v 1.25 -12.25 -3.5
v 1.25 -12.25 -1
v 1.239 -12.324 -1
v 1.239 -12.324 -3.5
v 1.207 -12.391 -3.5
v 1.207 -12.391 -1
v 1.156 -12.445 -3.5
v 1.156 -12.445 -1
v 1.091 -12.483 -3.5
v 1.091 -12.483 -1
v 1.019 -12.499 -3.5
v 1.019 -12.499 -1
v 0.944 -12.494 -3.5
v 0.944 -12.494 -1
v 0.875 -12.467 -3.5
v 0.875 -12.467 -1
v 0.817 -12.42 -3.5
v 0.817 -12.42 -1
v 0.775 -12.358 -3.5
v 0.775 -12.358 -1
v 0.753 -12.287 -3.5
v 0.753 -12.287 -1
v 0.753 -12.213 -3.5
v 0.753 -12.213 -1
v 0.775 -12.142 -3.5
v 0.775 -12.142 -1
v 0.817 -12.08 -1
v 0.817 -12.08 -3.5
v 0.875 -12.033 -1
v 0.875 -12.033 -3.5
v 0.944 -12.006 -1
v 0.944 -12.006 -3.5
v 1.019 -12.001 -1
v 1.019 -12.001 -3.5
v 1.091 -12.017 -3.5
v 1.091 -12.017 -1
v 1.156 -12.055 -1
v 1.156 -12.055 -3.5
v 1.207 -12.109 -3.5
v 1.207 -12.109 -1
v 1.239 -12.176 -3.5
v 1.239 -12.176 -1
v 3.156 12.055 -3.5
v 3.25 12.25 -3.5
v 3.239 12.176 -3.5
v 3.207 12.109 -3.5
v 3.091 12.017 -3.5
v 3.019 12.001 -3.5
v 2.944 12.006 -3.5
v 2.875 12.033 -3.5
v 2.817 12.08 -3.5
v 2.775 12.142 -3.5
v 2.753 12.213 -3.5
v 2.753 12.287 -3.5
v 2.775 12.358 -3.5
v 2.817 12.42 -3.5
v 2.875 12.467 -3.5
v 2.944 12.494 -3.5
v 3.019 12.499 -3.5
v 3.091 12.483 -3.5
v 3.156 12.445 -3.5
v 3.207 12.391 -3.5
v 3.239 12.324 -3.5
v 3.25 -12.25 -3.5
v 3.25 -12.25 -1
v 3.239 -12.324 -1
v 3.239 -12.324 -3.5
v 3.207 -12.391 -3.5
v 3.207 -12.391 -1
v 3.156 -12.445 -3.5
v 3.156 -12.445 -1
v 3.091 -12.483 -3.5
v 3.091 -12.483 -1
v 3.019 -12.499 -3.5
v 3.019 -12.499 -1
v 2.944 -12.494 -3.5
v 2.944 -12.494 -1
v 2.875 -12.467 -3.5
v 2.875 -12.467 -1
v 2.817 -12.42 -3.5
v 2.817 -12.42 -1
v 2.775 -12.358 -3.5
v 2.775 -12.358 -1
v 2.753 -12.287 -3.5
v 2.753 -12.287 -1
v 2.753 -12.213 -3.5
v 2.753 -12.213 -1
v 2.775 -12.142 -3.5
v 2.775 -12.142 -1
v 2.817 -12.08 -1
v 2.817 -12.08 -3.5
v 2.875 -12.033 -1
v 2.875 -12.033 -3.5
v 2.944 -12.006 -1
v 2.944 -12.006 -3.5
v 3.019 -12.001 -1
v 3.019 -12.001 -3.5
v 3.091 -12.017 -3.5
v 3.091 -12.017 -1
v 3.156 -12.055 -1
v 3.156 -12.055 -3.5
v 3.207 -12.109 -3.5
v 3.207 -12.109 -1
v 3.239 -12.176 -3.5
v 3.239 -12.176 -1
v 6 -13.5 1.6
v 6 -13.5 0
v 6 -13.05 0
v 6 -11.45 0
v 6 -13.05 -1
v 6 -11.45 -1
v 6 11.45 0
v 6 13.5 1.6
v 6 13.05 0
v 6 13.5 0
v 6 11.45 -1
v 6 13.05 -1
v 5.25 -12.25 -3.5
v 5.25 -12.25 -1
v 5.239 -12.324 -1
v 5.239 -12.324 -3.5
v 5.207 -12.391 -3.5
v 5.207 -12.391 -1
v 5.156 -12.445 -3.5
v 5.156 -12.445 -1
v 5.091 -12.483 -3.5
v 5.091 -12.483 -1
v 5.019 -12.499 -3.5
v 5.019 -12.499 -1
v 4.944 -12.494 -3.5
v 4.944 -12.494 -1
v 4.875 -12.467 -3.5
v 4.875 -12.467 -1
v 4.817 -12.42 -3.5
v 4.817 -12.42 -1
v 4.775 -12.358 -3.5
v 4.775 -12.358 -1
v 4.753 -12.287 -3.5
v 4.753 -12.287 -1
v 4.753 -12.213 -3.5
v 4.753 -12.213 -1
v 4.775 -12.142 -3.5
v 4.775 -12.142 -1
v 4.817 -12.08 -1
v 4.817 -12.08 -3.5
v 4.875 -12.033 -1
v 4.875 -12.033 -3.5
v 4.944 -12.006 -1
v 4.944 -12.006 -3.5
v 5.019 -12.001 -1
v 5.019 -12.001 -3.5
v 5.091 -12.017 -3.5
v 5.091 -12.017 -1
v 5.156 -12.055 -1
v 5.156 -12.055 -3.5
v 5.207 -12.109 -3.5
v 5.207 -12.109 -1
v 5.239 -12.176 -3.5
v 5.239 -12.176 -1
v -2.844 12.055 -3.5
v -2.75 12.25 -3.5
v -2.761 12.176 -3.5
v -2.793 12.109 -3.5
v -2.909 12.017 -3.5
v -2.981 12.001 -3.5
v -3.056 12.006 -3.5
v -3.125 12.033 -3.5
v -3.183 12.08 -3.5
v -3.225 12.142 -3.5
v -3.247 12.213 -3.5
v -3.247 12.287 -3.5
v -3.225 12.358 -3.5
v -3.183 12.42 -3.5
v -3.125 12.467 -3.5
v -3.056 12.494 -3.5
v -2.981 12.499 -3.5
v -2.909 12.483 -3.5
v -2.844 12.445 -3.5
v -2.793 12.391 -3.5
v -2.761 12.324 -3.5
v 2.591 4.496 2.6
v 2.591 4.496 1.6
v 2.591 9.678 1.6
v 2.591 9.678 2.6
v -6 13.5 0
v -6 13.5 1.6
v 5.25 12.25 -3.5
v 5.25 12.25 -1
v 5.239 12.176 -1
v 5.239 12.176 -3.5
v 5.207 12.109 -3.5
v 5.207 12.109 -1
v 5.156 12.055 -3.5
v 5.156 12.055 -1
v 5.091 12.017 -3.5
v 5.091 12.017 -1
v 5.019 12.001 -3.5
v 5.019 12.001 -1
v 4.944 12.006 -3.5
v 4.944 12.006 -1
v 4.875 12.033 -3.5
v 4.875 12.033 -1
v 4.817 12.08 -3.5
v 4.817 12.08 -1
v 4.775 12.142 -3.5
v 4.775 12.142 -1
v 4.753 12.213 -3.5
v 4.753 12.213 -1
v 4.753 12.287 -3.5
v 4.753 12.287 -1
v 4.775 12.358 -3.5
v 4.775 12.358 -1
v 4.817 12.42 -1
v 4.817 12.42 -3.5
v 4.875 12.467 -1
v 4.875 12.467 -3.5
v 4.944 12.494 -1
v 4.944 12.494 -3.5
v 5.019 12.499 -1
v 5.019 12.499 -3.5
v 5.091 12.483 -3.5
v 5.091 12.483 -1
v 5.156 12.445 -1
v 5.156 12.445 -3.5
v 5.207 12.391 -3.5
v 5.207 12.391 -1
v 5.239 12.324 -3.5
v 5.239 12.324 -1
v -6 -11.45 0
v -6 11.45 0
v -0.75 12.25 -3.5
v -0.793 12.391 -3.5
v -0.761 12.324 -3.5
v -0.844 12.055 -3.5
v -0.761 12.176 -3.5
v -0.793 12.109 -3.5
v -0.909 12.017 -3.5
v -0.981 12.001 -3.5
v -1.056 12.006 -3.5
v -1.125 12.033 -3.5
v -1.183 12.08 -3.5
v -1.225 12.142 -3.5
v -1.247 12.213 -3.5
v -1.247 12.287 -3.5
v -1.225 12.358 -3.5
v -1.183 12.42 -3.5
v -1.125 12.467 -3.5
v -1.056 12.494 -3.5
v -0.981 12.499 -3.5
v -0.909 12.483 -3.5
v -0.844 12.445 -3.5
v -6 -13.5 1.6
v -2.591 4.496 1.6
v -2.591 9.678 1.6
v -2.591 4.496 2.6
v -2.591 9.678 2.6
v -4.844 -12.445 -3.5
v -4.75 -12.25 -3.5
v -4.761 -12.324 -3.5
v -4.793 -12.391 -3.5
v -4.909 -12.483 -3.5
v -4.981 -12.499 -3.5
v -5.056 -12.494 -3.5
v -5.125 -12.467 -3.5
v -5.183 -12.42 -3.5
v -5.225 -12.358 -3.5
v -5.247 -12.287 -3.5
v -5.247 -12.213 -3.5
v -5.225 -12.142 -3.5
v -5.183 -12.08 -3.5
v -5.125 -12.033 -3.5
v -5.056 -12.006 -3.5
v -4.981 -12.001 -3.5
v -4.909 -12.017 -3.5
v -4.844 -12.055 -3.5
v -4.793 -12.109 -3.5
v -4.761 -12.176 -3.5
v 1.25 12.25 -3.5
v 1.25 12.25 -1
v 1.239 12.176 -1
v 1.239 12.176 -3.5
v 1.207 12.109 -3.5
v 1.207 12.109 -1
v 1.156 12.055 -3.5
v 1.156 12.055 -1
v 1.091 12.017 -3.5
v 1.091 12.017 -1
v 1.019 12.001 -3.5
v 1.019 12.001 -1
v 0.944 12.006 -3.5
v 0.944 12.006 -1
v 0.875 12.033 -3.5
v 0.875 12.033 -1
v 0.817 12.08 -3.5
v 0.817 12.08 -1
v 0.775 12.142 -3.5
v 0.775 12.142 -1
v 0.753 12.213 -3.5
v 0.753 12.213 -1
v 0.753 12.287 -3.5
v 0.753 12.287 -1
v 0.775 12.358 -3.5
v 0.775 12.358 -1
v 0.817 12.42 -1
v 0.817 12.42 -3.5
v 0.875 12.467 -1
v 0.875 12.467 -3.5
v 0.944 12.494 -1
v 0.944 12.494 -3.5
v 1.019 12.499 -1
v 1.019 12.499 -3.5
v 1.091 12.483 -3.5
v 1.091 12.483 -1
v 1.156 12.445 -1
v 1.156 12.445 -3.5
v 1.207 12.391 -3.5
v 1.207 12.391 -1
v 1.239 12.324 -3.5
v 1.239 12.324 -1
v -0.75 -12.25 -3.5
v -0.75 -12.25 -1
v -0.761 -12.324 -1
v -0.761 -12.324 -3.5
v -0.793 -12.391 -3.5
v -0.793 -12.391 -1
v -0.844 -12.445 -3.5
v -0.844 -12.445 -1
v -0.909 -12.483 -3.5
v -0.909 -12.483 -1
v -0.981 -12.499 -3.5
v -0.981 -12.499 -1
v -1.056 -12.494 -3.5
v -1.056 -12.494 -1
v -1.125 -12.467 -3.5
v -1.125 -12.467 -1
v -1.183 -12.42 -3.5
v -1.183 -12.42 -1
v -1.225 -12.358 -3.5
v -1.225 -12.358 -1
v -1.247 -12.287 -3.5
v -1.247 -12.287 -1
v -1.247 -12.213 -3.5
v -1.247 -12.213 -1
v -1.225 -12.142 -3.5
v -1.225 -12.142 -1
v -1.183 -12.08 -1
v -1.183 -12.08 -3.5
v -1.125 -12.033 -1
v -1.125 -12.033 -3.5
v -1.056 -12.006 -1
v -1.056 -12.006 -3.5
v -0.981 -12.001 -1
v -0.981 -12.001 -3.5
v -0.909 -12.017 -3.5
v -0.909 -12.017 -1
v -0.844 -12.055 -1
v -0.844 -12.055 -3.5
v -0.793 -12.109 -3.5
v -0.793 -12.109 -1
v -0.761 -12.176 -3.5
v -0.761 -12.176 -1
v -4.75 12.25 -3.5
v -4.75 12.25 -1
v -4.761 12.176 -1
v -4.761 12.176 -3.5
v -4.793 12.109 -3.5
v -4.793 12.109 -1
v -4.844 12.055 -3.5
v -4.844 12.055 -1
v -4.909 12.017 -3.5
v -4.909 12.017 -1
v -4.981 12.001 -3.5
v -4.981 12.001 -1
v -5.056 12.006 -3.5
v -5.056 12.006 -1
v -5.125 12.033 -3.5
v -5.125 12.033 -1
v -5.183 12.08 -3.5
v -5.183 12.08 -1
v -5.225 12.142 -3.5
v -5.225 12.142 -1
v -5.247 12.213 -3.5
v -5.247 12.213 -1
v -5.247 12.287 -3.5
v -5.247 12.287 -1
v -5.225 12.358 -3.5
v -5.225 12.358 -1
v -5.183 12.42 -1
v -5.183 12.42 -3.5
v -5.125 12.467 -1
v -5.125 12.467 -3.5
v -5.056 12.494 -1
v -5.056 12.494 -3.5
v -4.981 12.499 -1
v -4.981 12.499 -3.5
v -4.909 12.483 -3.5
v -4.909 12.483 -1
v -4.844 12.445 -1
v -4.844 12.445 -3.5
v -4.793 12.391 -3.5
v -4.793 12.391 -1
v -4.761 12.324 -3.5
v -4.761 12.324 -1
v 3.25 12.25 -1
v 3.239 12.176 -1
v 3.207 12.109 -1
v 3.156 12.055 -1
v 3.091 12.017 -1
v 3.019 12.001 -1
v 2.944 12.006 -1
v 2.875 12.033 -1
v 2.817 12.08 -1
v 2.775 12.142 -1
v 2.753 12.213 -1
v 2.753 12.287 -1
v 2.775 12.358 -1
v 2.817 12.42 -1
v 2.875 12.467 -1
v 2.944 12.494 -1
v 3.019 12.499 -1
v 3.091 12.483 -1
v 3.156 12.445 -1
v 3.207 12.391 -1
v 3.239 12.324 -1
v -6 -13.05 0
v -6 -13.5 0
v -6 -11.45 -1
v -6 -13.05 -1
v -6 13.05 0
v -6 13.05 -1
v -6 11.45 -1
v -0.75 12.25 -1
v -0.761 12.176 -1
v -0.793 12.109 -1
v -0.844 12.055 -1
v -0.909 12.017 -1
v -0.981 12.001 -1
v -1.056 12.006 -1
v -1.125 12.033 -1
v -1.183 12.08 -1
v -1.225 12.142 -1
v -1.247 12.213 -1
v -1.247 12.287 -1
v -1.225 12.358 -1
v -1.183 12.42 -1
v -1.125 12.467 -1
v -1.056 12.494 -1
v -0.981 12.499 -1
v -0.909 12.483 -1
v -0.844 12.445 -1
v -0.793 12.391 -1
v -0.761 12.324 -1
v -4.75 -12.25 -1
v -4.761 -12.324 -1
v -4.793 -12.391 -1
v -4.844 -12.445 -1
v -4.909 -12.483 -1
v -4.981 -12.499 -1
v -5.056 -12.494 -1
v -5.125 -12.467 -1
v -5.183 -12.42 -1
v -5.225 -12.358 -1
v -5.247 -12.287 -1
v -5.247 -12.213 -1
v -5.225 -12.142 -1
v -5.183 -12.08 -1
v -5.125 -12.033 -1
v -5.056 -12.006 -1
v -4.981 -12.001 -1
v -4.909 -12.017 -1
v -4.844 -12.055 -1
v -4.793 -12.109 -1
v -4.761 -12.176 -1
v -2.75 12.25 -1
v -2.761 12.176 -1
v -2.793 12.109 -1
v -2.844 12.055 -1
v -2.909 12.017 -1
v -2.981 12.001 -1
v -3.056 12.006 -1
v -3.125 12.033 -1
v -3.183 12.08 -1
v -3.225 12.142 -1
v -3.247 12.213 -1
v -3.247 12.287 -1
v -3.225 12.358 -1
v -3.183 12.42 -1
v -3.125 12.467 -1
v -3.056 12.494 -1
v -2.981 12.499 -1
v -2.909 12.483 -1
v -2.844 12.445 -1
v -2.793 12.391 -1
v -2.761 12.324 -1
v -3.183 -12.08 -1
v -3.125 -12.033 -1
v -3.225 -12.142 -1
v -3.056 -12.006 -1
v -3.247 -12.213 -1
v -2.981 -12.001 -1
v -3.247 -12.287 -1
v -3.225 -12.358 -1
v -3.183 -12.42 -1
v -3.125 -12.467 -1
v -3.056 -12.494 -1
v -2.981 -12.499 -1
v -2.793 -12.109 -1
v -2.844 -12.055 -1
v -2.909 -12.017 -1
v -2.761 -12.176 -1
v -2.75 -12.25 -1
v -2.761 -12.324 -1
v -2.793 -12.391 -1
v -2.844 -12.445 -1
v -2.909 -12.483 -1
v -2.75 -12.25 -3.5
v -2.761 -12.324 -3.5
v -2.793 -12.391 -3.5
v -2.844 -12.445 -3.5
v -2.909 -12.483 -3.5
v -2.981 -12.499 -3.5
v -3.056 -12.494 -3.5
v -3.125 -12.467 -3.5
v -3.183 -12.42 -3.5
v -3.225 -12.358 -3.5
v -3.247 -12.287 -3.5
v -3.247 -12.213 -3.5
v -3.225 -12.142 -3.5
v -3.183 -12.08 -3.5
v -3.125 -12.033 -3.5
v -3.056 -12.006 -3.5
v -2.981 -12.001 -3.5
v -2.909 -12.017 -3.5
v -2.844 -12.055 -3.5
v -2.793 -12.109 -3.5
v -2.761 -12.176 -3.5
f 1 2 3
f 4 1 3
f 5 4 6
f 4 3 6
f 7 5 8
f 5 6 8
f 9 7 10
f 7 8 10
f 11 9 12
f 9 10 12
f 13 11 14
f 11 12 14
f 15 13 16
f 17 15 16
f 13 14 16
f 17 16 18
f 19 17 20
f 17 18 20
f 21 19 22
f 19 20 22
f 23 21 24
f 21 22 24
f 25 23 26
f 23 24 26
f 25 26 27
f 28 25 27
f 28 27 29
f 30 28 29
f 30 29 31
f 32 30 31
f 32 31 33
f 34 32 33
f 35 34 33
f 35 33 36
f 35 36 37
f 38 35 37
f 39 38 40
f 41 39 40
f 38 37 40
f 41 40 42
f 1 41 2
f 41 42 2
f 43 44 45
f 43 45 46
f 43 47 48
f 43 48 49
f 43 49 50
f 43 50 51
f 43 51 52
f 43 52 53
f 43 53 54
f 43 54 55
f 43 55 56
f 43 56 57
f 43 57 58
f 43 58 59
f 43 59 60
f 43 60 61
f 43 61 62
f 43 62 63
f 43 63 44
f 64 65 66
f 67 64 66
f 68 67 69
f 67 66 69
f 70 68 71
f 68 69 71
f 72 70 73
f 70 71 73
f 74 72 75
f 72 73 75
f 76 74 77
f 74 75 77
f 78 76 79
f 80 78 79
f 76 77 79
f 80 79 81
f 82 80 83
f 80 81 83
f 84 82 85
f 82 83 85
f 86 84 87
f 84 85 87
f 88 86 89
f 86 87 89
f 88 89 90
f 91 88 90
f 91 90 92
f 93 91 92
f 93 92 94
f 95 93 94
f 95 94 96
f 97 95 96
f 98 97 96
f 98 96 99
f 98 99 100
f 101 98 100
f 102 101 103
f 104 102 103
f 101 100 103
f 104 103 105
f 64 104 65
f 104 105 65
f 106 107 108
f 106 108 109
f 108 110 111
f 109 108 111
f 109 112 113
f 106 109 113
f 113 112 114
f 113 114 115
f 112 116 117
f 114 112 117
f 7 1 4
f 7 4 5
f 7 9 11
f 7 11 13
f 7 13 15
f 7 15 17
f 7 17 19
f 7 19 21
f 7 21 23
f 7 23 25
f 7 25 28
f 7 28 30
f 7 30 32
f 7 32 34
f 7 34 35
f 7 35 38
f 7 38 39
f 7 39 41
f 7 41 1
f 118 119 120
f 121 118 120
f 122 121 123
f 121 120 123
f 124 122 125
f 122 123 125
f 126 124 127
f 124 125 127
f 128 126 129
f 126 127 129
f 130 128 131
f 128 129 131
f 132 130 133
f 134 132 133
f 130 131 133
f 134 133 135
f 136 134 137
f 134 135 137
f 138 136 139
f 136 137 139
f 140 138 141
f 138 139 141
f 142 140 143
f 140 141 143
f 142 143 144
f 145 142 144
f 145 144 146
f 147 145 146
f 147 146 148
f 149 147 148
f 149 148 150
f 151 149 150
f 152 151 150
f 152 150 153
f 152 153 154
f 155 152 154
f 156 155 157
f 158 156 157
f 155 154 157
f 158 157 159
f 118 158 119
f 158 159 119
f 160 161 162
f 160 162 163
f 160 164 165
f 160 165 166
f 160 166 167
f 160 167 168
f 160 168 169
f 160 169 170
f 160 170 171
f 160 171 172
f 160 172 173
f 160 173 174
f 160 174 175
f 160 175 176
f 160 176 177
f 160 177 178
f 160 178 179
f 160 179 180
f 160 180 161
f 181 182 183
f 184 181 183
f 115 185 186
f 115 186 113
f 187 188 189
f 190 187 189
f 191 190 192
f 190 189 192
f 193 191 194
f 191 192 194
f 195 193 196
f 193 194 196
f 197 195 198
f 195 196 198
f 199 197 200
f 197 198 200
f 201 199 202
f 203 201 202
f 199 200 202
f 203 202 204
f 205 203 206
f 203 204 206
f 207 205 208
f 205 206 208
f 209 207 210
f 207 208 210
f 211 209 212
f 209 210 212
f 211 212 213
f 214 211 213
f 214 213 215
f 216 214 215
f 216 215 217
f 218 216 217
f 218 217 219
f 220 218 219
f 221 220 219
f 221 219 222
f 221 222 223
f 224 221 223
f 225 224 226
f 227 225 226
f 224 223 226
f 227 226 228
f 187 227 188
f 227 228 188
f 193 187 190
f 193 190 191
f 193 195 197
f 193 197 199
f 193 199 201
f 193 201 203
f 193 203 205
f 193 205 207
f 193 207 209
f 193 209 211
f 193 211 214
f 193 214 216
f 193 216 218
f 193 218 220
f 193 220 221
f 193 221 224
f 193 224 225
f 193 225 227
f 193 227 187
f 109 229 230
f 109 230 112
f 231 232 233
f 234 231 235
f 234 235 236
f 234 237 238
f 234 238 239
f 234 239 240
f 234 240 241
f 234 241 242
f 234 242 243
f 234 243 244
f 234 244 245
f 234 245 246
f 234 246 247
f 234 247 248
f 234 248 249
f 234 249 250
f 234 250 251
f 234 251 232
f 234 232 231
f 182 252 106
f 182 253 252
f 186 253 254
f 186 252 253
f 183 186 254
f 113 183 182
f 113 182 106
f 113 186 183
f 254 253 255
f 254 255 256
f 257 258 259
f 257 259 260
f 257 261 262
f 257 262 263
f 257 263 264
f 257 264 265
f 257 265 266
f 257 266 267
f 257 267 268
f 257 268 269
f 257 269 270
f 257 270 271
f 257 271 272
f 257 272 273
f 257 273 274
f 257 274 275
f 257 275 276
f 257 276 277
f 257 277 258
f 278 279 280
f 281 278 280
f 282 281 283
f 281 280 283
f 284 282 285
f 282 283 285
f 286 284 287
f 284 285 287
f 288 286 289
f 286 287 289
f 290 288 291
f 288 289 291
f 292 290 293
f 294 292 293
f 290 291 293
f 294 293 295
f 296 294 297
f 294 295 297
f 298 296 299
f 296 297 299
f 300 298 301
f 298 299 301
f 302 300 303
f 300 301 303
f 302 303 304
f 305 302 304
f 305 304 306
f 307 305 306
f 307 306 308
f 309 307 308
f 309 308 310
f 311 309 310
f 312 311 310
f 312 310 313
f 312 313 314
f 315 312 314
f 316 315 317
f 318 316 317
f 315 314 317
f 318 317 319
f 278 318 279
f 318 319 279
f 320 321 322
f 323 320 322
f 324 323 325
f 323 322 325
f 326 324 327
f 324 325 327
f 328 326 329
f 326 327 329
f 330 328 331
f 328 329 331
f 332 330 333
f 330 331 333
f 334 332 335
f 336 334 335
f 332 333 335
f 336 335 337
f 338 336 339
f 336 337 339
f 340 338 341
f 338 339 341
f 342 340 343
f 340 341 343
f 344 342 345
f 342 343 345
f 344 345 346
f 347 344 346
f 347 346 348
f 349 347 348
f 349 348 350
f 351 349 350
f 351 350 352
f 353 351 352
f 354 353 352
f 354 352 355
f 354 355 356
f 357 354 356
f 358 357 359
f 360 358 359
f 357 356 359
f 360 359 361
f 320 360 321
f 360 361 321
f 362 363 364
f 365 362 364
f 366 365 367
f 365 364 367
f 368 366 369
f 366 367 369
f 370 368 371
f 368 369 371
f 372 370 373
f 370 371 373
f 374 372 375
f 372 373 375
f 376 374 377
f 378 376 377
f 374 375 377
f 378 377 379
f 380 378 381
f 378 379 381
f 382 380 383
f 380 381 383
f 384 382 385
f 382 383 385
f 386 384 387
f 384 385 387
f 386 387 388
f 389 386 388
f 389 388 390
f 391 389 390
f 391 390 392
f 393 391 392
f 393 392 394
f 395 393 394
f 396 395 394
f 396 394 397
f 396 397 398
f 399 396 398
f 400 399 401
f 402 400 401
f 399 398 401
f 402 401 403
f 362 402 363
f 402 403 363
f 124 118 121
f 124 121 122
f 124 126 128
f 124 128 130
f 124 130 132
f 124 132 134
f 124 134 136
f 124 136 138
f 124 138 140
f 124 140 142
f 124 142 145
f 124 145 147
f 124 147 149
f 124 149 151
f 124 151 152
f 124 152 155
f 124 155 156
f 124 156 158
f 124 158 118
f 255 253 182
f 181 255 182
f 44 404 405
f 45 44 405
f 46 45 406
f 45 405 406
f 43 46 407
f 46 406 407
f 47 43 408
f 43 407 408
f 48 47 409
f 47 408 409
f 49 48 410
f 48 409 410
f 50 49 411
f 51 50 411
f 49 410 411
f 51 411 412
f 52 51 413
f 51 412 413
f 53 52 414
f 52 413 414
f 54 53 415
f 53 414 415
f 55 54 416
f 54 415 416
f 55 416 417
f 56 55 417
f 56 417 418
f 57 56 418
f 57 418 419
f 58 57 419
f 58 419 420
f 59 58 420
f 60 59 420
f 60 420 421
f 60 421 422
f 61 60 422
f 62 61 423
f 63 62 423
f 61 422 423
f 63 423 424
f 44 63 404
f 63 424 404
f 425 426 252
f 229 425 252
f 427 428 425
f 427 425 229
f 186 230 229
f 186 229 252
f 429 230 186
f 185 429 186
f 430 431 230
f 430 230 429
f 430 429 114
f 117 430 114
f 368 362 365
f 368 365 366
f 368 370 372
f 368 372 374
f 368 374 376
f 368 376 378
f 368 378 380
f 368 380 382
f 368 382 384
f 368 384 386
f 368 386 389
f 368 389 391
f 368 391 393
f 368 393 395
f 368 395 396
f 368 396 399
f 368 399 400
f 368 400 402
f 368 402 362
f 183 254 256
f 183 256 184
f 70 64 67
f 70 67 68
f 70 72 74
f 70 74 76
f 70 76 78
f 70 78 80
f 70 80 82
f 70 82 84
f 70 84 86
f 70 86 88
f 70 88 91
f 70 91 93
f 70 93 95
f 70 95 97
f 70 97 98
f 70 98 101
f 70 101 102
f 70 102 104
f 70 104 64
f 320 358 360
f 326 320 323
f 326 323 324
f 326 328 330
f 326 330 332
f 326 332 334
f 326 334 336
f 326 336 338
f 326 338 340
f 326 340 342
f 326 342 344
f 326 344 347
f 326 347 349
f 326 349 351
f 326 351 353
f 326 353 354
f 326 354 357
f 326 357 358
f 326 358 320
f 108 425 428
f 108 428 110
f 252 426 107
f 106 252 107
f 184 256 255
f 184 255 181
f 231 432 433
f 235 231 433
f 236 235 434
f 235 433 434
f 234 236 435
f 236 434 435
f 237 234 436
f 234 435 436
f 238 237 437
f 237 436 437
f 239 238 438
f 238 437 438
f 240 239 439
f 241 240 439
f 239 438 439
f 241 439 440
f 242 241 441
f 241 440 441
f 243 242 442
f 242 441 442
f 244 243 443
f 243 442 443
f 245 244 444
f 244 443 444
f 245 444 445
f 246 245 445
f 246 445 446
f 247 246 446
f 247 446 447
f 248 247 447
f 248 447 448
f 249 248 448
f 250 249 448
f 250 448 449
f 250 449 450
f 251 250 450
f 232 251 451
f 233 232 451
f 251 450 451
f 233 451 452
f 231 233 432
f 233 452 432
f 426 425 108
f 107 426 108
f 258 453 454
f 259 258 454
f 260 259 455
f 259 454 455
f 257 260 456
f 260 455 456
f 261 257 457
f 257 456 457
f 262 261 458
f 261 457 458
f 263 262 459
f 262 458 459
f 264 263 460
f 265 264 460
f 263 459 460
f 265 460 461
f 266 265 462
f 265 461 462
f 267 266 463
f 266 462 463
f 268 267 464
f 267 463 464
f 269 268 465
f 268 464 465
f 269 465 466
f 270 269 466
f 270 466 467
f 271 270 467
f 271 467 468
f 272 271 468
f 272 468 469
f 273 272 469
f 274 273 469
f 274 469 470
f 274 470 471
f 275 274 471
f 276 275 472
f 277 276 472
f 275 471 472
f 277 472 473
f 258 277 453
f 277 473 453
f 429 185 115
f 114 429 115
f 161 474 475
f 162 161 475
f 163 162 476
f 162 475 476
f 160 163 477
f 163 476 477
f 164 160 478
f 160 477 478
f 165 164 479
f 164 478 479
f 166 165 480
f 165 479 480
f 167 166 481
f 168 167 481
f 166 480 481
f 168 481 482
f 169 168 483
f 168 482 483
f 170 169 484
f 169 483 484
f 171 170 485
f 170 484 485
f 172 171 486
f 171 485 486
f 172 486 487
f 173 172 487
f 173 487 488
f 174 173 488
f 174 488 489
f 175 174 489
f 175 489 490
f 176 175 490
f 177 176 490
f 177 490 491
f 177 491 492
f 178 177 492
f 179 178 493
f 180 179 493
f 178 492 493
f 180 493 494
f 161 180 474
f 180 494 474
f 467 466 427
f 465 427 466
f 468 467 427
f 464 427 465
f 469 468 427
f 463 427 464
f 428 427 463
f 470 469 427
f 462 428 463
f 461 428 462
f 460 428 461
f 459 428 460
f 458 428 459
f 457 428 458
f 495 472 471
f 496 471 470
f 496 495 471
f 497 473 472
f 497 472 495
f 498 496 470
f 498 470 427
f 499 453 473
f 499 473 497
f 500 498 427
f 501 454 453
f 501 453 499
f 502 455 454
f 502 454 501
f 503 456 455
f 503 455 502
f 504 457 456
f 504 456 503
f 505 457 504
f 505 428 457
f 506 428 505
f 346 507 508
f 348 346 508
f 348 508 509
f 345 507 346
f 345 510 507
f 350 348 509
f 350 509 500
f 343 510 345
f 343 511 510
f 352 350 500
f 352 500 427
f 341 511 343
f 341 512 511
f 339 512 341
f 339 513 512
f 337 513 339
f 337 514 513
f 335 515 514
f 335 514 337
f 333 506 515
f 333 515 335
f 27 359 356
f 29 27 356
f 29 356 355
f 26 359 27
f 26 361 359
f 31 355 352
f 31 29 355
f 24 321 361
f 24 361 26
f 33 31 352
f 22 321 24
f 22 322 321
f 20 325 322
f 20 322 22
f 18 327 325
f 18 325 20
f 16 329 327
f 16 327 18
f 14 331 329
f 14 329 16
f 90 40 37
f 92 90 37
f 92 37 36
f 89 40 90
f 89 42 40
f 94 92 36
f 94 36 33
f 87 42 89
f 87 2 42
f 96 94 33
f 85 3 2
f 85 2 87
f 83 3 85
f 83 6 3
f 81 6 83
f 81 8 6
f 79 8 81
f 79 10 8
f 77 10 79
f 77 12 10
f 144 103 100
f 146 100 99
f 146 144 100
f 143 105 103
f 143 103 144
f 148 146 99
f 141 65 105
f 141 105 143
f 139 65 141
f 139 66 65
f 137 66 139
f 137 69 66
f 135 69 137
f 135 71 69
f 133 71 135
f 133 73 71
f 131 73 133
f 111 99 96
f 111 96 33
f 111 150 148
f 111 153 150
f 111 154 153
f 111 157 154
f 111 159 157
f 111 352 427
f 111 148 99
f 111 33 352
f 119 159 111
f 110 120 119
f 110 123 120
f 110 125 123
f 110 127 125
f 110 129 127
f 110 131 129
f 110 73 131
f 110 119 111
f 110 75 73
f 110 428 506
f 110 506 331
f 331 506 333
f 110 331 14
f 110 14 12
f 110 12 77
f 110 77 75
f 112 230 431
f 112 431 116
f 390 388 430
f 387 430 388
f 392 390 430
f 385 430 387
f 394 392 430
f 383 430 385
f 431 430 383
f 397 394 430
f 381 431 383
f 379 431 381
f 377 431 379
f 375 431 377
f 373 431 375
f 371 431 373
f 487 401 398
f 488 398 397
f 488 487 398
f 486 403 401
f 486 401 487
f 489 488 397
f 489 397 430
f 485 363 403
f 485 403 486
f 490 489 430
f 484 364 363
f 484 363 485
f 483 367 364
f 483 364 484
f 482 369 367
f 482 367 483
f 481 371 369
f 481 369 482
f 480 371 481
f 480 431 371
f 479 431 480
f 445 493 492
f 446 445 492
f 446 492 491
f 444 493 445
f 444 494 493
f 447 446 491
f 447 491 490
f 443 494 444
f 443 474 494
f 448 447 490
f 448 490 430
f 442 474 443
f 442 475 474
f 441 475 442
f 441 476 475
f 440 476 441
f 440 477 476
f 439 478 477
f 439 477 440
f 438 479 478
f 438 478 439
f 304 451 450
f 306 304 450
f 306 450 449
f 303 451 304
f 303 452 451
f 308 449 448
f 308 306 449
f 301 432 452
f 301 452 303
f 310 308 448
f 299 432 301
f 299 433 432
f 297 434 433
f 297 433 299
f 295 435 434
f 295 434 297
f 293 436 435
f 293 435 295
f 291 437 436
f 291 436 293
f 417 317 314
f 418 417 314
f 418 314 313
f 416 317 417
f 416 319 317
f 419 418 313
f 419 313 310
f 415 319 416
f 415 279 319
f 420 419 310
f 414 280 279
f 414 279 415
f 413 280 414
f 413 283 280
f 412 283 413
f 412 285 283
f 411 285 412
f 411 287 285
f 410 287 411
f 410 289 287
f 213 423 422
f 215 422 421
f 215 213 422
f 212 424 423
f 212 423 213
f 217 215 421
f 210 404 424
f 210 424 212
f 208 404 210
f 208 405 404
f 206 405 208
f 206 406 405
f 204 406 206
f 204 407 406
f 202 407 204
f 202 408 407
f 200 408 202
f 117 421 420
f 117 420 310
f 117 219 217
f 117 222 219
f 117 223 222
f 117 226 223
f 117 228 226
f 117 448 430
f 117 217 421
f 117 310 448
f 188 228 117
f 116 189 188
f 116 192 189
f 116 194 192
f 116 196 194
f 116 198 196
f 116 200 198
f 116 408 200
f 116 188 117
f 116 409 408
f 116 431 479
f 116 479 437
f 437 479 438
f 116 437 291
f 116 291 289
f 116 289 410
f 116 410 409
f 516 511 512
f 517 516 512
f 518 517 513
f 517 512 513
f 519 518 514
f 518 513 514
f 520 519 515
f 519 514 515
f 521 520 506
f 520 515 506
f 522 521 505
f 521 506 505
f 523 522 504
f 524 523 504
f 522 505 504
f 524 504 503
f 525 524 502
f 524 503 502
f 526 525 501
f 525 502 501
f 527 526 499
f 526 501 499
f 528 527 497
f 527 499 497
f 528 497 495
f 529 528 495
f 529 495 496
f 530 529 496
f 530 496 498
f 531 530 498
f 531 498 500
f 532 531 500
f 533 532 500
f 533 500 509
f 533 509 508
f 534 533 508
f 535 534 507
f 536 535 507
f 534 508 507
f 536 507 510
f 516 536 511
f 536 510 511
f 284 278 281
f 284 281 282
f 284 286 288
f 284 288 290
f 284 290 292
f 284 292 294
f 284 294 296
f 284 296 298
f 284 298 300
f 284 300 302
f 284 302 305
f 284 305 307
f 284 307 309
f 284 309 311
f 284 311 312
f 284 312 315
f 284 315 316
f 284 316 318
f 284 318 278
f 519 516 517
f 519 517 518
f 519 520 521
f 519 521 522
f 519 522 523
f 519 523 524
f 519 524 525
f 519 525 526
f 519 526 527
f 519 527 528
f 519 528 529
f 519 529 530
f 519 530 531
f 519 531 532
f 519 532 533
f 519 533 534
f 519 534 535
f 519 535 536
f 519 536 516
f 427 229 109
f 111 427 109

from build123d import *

# Parameters (mm, degrees)
F0_W     = 12
F0_H     = 27
F1_DEPTH = 1.6
F2_W     = 12
F2_H     = 1.6
F3_DEPTH = 1
F4_R     = 0.25
F5_DEPTH = 2.5
F6_W     = 5.18181
F6_H     = 5.181811
F7_DEPTH = 1


with BuildPart() as f1:
    # F0 (on Top) → F1 (new body)
    with BuildSketch(Plane.XY):
        Rectangle(F0_W, F0_H)
    extrude(amount=F1_DEPTH)

    # F2 (on face) → F3 (join)
    with BuildSketch(Plane(origin=(0, 0, 0), x_dir=(1, 0, 0), z_dir=(0, 0, -1))):
        with Locations((0, -12.25)):
            Rectangle(F2_W, F2_H)
        with Locations((0, 12.25)):
            Rectangle(F2_W, F2_H)
    extrude(amount=F3_DEPTH)

    # F4 (on face) → F5 (join)
    with BuildSketch(Plane(origin=(0, 0, -1), x_dir=(1, 0, 0), z_dir=(0, 0, -1))):
        with Locations((-5, -12.25)):
            Circle(F4_R)
        with Locations((-5, 12.25)):
            Circle(F4_R)
        with Locations((-3, -12.25)):
            Circle(F4_R)
        with Locations((-3, 12.25)):
            Circle(F4_R)
        with Locations((-1, -12.25)):
            Circle(F4_R)
        with Locations((-1, 12.25)):
            Circle(F4_R)
        with Locations((1, -12.25)):
            Circle(F4_R)
        with Locations((1, 12.25)):
            Circle(F4_R)
        with Locations((3, -12.25)):
            Circle(F4_R)
        with Locations((3, 12.25)):
            Circle(F4_R)
        with Locations((5, -12.25)):
            Circle(F4_R)
        with Locations((5, 12.25)):
            Circle(F4_R)
    extrude(amount=F5_DEPTH)

    # F6 (on face) → F7 (join)
    with BuildSketch(Plane.XY.offset(1.6)):
        with Locations((0, 7.086888)):
            Rectangle(F6_W, F6_H)
    extrude(amount=F7_DEPTH)


solid = f1.part
